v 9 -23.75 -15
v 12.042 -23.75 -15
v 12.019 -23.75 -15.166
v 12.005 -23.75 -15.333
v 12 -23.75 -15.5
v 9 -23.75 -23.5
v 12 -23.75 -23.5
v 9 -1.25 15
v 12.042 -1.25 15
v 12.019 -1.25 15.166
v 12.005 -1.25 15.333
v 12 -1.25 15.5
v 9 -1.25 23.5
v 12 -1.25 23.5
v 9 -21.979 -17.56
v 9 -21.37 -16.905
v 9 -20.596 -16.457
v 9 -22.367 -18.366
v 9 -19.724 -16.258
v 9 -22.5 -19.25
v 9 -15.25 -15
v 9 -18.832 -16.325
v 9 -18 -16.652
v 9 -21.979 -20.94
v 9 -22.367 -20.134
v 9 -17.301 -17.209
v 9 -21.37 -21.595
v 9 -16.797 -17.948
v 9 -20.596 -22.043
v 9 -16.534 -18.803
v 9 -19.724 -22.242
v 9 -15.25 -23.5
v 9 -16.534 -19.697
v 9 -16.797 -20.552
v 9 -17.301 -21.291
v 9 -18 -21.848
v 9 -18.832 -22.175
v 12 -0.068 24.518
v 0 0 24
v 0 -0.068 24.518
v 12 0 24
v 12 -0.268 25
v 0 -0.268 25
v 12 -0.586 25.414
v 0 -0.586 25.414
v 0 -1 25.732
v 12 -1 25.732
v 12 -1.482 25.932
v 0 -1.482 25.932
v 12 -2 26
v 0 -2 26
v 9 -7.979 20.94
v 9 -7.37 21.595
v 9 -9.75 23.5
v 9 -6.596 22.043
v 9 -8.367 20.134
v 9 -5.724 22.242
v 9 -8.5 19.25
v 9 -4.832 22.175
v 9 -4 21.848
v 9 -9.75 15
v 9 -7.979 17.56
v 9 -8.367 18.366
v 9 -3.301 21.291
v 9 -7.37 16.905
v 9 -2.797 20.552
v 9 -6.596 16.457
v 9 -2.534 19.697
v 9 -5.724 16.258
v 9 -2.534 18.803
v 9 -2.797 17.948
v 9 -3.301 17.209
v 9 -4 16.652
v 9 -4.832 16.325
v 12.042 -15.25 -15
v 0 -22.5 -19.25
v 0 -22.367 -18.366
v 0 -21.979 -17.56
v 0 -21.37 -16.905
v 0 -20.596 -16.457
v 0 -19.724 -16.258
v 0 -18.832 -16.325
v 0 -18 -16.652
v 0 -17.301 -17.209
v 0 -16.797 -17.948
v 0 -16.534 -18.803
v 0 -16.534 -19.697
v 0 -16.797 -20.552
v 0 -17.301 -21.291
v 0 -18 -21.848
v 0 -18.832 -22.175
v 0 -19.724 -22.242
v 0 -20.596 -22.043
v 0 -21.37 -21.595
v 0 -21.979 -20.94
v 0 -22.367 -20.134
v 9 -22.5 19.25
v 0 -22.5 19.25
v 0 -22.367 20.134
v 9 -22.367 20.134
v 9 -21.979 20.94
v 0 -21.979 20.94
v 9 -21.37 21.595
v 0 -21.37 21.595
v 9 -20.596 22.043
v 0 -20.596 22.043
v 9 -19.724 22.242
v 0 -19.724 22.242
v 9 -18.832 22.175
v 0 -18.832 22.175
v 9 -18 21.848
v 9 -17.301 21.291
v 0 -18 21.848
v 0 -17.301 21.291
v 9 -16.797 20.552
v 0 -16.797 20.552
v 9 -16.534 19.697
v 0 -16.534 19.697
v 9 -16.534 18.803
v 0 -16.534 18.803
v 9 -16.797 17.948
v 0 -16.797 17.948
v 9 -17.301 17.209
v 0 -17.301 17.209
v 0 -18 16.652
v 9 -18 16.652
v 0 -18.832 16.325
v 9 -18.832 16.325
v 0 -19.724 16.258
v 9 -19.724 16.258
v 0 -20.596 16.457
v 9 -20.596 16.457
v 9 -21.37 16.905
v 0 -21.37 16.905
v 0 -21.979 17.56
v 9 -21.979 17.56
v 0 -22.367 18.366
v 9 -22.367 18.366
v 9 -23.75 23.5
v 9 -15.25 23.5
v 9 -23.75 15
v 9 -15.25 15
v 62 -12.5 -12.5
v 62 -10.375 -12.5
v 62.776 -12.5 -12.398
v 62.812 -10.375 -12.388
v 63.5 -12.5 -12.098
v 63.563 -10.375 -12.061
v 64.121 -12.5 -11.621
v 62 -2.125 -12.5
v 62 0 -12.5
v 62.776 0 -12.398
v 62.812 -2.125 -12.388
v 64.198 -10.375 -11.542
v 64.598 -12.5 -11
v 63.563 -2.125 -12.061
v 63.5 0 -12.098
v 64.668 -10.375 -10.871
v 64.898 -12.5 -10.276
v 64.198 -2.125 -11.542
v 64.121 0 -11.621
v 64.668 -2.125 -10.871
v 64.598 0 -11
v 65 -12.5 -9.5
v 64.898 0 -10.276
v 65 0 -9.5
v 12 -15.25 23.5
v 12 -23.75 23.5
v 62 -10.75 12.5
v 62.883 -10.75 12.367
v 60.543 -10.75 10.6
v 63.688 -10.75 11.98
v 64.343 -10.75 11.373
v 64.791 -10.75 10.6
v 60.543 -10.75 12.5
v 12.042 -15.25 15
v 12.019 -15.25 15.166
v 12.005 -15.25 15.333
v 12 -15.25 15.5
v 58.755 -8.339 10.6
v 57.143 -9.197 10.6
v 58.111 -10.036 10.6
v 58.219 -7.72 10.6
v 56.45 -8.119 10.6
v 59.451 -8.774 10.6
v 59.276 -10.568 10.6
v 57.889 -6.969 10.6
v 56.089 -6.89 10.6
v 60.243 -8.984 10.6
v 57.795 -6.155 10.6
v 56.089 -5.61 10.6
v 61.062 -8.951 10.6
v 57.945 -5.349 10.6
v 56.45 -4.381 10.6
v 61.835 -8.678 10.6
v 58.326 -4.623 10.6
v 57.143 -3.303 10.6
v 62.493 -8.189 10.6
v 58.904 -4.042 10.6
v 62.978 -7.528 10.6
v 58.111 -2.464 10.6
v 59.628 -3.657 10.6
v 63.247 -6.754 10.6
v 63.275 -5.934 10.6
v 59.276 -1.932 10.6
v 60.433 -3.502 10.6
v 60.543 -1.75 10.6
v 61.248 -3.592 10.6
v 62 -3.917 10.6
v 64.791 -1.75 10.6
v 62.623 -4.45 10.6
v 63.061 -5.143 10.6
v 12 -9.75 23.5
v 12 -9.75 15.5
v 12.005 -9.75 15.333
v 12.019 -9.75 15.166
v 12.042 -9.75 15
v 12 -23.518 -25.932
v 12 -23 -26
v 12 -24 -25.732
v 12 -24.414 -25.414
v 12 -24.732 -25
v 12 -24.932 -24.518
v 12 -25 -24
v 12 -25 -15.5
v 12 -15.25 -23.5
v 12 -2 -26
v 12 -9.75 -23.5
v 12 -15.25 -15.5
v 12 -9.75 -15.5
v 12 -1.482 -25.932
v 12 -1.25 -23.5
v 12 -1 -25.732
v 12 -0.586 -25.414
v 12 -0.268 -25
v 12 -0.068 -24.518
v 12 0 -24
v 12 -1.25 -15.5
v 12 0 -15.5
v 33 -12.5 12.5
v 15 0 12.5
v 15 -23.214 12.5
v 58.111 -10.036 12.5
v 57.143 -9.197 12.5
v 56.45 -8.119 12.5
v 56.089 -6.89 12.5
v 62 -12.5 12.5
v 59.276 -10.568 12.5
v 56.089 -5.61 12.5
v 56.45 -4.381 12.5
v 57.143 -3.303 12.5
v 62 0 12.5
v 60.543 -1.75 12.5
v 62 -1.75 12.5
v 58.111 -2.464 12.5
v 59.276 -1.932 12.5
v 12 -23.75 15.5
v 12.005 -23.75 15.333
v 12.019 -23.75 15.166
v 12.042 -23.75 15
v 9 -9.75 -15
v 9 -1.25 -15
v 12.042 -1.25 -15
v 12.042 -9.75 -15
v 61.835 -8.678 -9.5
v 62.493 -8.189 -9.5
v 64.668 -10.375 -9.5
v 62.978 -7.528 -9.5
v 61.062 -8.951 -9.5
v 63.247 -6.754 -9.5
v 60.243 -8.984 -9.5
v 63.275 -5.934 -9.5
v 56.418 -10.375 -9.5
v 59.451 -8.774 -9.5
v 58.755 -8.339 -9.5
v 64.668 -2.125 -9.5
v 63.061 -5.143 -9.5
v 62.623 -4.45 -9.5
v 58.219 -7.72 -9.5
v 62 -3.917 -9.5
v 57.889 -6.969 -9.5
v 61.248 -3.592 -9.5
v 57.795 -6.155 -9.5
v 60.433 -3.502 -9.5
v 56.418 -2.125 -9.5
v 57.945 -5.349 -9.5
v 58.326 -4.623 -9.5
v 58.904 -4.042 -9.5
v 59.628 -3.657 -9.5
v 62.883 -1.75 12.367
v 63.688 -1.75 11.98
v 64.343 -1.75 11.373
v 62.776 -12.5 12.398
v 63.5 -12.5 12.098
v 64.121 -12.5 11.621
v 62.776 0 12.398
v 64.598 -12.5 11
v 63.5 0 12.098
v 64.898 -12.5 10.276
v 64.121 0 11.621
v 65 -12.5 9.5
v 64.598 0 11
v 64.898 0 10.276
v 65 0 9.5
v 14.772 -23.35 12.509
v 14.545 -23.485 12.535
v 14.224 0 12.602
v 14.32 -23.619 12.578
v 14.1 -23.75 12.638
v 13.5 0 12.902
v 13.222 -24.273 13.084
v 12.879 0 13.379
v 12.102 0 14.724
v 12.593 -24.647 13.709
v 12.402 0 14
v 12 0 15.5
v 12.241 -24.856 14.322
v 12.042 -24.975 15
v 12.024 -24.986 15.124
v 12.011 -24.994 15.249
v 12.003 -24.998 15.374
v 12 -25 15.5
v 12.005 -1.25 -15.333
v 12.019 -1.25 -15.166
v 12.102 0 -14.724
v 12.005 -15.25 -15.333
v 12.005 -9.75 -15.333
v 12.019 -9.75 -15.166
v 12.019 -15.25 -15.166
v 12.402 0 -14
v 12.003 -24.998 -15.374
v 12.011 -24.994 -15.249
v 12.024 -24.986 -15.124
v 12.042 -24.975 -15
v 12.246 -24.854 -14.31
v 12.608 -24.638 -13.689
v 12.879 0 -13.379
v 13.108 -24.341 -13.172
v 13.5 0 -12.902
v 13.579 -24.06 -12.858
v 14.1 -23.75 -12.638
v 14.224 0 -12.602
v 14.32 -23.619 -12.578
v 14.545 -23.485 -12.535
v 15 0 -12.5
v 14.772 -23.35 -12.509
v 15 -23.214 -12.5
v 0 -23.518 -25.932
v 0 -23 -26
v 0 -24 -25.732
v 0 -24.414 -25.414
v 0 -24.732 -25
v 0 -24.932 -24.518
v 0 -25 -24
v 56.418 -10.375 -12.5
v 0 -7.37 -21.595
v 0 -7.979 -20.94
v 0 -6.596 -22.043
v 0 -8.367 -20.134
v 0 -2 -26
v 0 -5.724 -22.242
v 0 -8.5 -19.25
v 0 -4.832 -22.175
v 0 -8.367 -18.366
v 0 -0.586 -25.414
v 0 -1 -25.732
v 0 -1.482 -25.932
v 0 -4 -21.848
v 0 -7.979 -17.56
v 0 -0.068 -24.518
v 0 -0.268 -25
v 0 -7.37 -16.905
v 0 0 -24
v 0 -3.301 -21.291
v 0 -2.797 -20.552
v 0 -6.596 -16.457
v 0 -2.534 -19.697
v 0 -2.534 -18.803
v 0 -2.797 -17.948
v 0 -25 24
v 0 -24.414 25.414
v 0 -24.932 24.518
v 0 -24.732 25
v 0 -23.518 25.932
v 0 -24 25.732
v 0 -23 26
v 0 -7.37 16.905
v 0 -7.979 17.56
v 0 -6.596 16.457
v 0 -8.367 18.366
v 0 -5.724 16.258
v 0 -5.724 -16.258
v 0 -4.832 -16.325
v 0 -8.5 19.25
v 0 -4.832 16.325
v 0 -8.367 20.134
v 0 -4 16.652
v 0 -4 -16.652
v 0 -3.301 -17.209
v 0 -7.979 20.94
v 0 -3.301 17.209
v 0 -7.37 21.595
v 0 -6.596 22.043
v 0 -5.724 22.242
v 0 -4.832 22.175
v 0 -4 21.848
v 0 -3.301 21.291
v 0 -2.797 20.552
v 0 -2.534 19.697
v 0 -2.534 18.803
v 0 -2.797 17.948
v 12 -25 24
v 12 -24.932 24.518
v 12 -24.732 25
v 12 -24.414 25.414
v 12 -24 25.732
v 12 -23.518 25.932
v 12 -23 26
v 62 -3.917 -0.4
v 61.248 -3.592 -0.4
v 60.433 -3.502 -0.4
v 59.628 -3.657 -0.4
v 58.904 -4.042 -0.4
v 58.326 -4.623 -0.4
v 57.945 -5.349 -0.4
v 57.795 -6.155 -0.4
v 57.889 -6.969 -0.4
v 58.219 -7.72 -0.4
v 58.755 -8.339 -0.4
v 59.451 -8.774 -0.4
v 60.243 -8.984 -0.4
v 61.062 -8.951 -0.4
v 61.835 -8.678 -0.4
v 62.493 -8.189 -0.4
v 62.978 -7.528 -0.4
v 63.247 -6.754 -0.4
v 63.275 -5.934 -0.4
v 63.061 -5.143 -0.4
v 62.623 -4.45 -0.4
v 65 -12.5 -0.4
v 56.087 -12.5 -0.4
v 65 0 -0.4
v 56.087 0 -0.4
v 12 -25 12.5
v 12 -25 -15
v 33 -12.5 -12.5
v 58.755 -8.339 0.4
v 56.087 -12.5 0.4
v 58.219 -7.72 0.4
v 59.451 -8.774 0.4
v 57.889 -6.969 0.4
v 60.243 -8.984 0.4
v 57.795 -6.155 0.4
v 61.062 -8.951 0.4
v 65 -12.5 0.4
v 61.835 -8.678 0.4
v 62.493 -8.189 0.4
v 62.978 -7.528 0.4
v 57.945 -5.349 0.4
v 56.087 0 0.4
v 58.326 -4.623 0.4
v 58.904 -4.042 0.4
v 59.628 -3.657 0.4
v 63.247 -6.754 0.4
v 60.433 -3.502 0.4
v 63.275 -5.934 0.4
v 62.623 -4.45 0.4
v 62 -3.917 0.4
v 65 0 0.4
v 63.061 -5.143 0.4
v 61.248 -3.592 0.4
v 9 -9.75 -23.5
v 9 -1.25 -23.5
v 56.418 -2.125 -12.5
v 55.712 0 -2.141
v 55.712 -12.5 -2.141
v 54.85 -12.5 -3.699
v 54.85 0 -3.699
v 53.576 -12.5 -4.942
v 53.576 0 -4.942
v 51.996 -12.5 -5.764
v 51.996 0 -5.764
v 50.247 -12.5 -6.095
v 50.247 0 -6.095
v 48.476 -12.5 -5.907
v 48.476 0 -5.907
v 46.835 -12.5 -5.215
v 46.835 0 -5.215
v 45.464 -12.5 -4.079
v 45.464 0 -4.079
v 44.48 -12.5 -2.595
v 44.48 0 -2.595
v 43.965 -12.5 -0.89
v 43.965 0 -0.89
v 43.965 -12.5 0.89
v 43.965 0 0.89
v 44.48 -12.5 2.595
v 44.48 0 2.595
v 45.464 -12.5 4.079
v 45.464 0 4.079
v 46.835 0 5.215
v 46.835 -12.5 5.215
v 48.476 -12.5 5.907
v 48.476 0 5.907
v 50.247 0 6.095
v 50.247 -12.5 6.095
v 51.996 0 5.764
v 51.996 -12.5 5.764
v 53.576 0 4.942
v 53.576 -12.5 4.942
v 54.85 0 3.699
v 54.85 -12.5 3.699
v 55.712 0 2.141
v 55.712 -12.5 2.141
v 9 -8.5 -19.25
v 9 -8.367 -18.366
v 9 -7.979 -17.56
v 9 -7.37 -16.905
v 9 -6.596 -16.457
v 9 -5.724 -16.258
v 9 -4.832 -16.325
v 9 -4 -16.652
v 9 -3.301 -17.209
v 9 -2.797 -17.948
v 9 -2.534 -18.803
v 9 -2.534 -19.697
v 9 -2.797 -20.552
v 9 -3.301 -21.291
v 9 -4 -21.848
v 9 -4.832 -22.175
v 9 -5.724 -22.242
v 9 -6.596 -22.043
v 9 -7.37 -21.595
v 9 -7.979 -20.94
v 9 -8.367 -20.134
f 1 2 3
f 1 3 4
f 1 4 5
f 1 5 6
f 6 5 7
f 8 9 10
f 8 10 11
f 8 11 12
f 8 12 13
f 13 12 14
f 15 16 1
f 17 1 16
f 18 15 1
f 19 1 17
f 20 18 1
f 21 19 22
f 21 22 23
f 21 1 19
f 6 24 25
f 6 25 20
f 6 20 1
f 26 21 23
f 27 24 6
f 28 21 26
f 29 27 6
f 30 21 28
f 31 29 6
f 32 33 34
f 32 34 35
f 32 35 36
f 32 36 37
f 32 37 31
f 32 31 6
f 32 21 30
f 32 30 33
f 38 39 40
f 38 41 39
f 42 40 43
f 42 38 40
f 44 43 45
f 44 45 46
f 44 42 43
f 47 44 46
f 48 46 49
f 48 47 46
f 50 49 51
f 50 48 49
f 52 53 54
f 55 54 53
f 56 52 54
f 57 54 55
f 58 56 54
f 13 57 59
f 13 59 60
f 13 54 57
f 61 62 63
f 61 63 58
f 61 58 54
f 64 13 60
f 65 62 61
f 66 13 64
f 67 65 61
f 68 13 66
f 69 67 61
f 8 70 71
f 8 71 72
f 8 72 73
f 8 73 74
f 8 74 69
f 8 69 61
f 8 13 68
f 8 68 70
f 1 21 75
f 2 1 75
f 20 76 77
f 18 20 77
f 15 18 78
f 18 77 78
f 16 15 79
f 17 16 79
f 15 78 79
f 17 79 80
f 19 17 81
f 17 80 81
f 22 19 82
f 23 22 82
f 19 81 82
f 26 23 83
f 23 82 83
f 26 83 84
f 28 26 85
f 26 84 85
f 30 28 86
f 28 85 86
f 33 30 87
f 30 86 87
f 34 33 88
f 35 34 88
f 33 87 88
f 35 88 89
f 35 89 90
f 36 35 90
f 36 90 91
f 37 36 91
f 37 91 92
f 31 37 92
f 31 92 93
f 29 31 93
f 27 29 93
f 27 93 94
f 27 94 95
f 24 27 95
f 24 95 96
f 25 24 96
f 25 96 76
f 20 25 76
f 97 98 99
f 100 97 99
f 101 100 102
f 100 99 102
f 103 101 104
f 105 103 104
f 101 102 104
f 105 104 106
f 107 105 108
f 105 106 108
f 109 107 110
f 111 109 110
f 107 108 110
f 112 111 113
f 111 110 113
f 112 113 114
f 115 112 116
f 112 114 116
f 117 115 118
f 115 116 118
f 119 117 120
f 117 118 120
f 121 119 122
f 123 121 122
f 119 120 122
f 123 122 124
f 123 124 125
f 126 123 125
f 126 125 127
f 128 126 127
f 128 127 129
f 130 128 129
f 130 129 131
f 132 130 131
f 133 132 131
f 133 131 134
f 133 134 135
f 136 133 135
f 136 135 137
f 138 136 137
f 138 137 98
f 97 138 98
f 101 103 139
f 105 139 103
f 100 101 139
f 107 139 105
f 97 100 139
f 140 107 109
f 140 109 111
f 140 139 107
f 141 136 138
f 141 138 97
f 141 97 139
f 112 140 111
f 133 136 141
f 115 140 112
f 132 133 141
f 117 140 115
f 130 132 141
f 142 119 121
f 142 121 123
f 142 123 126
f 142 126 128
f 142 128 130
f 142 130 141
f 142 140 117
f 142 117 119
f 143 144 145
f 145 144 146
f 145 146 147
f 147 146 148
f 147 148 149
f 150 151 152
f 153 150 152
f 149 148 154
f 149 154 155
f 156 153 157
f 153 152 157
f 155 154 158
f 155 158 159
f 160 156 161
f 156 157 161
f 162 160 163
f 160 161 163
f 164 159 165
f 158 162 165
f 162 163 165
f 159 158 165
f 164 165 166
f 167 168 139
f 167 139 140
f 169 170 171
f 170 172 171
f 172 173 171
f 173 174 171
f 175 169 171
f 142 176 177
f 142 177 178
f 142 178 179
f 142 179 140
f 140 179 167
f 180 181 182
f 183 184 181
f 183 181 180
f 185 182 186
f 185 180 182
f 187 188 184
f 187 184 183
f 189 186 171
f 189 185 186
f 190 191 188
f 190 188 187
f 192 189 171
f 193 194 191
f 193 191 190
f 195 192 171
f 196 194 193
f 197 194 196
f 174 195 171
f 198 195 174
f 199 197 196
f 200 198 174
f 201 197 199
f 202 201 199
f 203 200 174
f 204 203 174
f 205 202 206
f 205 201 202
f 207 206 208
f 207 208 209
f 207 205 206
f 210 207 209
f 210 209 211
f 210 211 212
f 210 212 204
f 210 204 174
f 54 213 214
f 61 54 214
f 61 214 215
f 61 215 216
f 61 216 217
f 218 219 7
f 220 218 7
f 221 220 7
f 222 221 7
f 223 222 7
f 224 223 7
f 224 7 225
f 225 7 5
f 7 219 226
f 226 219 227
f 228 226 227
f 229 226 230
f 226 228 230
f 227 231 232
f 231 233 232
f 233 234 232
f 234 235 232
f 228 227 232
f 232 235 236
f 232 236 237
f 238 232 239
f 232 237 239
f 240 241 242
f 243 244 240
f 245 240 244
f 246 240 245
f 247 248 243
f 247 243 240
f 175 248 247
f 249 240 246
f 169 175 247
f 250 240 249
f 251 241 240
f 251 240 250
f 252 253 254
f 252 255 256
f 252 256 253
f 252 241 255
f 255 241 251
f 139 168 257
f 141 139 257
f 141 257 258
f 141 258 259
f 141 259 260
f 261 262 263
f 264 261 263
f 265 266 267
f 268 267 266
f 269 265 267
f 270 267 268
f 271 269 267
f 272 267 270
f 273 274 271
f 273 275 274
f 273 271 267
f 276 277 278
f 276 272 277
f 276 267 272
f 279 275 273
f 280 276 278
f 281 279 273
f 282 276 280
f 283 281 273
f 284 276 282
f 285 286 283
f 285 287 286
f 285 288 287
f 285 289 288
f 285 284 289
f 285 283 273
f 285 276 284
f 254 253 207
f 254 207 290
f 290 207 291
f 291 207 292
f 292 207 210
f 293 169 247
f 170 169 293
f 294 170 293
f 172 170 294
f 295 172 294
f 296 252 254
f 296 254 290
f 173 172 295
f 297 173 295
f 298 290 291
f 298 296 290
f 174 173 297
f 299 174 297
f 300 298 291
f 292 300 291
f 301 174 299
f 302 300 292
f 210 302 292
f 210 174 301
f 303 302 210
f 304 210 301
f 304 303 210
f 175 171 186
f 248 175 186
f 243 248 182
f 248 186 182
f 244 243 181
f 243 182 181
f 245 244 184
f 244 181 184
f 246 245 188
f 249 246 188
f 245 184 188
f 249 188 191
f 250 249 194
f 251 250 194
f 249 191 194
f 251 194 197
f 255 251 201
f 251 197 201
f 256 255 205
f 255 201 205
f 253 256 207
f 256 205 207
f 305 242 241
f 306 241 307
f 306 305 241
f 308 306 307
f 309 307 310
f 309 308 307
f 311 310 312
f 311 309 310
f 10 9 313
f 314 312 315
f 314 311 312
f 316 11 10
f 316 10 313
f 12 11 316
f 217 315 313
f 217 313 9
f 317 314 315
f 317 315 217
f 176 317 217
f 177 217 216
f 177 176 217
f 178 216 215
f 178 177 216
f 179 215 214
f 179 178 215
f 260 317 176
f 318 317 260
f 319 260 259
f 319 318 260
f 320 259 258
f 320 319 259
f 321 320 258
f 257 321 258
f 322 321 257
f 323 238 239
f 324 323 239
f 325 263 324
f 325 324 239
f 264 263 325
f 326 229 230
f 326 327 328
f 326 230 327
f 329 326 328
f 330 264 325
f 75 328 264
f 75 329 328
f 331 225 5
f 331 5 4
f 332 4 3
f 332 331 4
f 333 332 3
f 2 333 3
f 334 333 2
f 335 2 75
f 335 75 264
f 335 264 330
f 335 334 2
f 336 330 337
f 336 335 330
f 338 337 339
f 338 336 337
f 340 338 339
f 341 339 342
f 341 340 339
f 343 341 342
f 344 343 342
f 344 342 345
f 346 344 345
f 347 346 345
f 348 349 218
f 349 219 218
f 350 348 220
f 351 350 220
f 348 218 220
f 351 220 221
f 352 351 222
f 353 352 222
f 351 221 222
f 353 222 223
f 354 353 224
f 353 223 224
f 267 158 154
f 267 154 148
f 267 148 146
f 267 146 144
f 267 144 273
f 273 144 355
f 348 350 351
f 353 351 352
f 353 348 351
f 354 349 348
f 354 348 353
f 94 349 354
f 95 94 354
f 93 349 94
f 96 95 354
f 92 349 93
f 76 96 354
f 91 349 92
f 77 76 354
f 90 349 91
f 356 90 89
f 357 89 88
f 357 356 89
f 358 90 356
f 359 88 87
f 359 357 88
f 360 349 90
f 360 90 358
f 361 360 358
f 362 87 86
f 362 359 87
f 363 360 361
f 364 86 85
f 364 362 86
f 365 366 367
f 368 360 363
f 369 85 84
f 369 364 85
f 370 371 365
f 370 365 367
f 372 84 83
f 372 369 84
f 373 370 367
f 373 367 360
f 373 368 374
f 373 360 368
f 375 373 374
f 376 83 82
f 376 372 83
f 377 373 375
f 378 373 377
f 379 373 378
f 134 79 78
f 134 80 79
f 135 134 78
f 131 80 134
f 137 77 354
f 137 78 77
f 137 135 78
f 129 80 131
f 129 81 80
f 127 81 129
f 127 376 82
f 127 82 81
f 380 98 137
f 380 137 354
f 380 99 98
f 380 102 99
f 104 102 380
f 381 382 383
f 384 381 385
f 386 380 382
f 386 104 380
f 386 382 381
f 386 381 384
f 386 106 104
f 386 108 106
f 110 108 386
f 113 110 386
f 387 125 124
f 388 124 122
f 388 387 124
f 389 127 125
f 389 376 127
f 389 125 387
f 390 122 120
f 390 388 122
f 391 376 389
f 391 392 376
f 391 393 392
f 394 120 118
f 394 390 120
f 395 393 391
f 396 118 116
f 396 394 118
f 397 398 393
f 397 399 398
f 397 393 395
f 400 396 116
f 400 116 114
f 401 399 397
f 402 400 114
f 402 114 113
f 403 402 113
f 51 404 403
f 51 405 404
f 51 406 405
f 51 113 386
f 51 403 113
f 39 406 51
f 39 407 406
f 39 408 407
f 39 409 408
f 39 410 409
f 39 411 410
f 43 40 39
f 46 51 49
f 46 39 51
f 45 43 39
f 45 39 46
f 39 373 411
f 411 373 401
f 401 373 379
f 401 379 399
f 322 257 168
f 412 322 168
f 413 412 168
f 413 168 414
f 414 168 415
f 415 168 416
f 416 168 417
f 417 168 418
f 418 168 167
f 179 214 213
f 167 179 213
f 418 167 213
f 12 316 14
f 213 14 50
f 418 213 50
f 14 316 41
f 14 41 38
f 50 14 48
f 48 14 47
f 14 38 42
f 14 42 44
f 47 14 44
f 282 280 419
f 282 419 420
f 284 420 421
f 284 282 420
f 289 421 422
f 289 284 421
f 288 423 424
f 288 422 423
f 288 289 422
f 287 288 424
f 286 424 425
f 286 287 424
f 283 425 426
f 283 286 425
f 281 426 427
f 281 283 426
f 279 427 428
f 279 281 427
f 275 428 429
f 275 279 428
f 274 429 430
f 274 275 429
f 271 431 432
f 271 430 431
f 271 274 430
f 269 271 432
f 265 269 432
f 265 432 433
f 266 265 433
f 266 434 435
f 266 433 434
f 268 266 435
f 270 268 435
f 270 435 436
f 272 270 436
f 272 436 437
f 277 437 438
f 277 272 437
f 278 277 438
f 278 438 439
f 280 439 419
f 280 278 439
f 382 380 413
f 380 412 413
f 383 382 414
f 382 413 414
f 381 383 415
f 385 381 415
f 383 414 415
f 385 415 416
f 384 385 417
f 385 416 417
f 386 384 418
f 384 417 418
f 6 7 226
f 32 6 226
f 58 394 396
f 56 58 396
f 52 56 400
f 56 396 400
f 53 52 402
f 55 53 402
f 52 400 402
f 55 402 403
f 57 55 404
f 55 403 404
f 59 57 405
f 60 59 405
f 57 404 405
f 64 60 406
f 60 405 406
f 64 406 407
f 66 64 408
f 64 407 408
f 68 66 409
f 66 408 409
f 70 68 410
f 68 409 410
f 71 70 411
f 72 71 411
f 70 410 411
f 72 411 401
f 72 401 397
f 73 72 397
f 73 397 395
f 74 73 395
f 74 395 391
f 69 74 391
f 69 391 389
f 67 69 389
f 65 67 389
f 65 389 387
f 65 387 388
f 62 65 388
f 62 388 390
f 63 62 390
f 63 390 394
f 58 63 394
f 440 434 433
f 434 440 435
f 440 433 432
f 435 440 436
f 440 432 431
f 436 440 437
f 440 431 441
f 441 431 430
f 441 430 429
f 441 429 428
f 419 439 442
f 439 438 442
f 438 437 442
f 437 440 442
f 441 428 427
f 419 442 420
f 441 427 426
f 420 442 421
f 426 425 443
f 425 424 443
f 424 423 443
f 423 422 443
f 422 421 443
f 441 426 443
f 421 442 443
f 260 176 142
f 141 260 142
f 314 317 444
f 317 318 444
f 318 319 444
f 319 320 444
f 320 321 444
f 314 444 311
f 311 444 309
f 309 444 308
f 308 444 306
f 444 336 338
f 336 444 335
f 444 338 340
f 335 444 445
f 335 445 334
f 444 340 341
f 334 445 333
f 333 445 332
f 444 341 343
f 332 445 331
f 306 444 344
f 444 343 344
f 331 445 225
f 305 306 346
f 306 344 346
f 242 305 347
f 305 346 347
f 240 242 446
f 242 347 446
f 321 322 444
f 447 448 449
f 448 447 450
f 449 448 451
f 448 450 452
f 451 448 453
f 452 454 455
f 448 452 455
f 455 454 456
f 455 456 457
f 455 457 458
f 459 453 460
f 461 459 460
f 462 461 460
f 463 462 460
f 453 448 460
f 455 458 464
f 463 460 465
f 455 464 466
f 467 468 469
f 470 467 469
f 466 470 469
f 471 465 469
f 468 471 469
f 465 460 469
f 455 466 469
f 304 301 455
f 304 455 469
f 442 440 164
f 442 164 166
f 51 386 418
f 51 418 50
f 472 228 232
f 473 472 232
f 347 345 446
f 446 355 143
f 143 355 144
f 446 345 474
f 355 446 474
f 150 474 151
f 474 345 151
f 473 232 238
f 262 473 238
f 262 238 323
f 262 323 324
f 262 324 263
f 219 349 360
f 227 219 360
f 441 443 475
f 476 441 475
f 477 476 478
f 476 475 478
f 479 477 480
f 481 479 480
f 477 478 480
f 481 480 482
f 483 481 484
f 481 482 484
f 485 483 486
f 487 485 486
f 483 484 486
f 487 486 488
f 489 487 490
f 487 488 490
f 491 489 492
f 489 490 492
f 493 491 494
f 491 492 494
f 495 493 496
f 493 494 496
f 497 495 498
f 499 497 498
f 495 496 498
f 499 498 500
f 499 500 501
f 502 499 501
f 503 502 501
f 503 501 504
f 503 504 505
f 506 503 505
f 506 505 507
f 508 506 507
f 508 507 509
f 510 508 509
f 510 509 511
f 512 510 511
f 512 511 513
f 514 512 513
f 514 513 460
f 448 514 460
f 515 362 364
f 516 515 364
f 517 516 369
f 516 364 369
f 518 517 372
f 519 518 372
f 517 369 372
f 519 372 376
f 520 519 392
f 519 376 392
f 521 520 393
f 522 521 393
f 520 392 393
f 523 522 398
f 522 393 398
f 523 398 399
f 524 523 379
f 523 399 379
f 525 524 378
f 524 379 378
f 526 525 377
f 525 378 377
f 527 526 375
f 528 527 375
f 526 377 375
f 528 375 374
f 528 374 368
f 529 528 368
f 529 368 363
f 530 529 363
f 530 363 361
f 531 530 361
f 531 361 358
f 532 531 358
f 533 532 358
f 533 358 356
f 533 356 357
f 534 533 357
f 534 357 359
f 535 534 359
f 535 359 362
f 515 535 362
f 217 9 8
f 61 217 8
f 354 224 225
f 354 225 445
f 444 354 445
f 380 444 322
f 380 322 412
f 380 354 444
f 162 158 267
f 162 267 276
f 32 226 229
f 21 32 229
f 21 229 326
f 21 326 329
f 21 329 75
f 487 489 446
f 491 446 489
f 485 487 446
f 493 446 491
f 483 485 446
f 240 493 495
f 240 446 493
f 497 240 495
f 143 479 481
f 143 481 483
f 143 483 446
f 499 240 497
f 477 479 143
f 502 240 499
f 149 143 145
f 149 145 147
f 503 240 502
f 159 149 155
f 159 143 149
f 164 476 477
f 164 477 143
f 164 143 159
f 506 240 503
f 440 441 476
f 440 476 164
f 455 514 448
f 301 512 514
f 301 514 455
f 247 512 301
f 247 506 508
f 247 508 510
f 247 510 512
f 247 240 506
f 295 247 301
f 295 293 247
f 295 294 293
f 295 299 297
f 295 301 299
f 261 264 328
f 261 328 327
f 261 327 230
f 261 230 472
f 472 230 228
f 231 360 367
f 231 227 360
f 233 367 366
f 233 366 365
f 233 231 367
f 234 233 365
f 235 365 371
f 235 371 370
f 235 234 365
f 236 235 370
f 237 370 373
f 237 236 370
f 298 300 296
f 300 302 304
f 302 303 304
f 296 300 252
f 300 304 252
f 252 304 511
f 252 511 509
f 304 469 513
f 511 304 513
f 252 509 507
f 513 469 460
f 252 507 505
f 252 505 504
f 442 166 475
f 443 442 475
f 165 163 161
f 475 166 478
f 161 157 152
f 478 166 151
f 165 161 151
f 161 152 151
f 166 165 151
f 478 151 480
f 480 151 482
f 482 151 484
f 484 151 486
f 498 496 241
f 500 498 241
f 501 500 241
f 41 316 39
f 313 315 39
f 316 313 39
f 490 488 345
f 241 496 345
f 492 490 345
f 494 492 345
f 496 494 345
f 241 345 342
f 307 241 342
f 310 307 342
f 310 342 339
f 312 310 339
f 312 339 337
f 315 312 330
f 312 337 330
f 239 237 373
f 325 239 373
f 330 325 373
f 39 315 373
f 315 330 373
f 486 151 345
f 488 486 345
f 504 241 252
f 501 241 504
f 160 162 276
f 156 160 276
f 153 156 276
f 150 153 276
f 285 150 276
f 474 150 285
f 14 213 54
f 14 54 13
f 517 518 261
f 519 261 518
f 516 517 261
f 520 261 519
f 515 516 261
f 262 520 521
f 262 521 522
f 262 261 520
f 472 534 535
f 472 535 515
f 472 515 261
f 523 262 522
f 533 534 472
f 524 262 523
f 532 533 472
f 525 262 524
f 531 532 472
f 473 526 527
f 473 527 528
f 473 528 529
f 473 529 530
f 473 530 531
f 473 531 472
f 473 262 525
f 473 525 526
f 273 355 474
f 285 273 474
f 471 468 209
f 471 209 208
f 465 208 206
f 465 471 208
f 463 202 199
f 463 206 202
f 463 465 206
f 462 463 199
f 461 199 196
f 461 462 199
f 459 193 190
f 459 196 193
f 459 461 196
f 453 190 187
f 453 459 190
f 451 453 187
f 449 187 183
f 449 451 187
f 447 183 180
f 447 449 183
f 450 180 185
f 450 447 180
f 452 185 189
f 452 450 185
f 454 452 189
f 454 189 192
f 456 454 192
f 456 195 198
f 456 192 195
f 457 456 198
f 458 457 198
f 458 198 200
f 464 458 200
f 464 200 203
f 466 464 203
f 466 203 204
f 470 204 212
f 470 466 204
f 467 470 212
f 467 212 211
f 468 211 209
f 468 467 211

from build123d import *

# Parameters (mm, degrees)
BOSS_EXTRUDE1_DEPTH     = 12.5
SKETCH2_W               = 52
SKETCH2_H               = 25
SKETCH2_R               = 3
BOSS_EXTRUDE2_DEPTH     = 12
CUT_EXTRUDE2_DEPTH      = 75.33707016
FILLET1_R               = 2
FILLET2_R               = 3
CUT_EXTRUDE3_DEPTH      = 75.47791619
CUT_EXTRUDE3_DEPTH_BACK = 75.47791619
SKETCH7_R               = 2.75
CUT_EXTRUDE4_START      = 11
SKETCH7_3_R             = 2.75
CUT_EXTRUDE4_DEPTH      = 20
SKETCH9_W               = 8.25
SKETCH9_H               = 8.25
CUT_EXTRUDE5_DEPTH      = 3
SKETCH12_W              = 8.5
SKETCH12_H              = 8.5
CUT_EXTRUDE7_DEPTH      = 3
FILLET3_R               = 3


with BuildPart() as part:
    # Sketch1 → Boss-Extrude1 (new, symmetric)
    with BuildSketch(Plane.XY):
        Polygon((12, -25), (33, -12.5), (65, -12.5), (65, 0), (0, 0), (0, -25), align=None)
    extrude(amount=BOSS_EXTRUDE1_DEPTH, both=True)

    # Sketch2 → Boss-Extrude2 (add)
    with BuildSketch(Plane.ZY):
        with Locations((0, -12.5)):
            Rectangle(SKETCH2_W, SKETCH2_H)
        with Locations(Location((-19.25, -5.5, 0), (0, 0, 270))):
            Circle(SKETCH2_R, mode=Mode.SUBTRACT)
        with Locations(Location((-19.25, -19.5, 0), (0, 0, 270))):
            Circle(SKETCH2_R, mode=Mode.SUBTRACT)
        with Locations(Location((19.25, -19.5, 0), (0, 0, 270))):
            Circle(SKETCH2_R, mode=Mode.SUBTRACT)
        with Locations(Location((19.25, -5.5, 0), (0, 0, 270))):
            Circle(SKETCH2_R, mode=Mode.SUBTRACT)
    extrude(amount=-BOSS_EXTRUDE2_DEPTH)

    # Sketch4 → Cut-Extrude2 (cut, through all)
    with BuildSketch(Plane(origin=(0, 0, 0), x_dir=(1, 0, 0), z_dir=(0, 1, 0))):
        with BuildLine():
            Line((56.086871117, -0.4), (65, -0.4))
            Line((65, -0.4), (65, 0.4))
            Line((65, 0.4), (56.086871117, 0.4))
            ThreePointArc((56.086871117, 0.4), (43.9, 0), (56.086871117, -0.4))
        make_face()
    extrude(amount=-CUT_EXTRUDE2_DEPTH, mode=Mode.SUBTRACT)

    # Fillet1
    fillet1_edges = [part.edges().sort_by_distance(p)[0] for p in [
        (6, -25, -26),
        (6, 0, -26),
        (6, 0, 26),
        (6, -25, 26),
    ]]
    fillet(fillet1_edges, radius=FILLET1_R)

    # Fillet2
    fillet2_edges = [part.edges().sort_by_distance(p)[0] for p in [
        (65, -6.25, 12.5),
        (65, -6.25, -12.5),
    ]]
    fillet(fillet2_edges, radius=FILLET2_R)

    # Sketch7 → Cut-Extrude3 (cut, two sides: drawn at the far end of the back side and taken through both)
    with BuildSketch(Plane.XY.offset(-0.4).offset(-CUT_EXTRUDE3_DEPTH_BACK)):
        with Locations(Location((60.543435559, -6.25, 0), (0, 0, 58.017528447))):
            Circle(SKETCH7_R)
    extrude(amount=CUT_EXTRUDE3_DEPTH + CUT_EXTRUDE3_DEPTH_BACK, mode=Mode.SUBTRACT)

    # Sketch7<3> → Cut-Extrude4 (cut)
    with BuildSketch(Plane.XY.offset(-0.4).offset(CUT_EXTRUDE4_START)):
        with Locations((60.543435559, -6.25)):
            Circle(SKETCH7_3_R)
        with BuildLine():
            Line((60.543435559, -1.75), (65, -1.75))
            Line((65, -1.75), (65, -10.75))
            Line((65, -10.75), (60.543435559, -10.75))
            ThreePointArc((60.543435559, -10.75), (56.043435559, -6.25), (60.543435559, -1.75))
        make_face()
    extrude(amount=CUT_EXTRUDE4_DEPTH, mode=Mode.SUBTRACT)

    # Sketch9 → Cut-Extrude5 (cut)
    with BuildSketch(Plane(origin=(0, 0, -12.5), x_dir=(-1, 0, 0), z_dir=(0, 0, -1))):
        with Locations((-60.543435559, -6.25)):
            Rectangle(SKETCH9_W, SKETCH9_H)
    extrude(amount=-CUT_EXTRUDE5_DEPTH, mode=Mode.SUBTRACT)

    # Sketch12 → Cut-Extrude7 (cut)
    with BuildSketch(Plane(origin=(12, 0, 0), x_dir=(0, 0, -1), z_dir=(1, 0, 0))):
        with Locations((19.25, -5.5)):
            Rectangle(SKETCH12_W, SKETCH12_H)
        with Locations((-19.25, -5.5)):
            Rectangle(SKETCH12_W, SKETCH12_H)
        with Locations((19.25, -19.5)):
            Rectangle(SKETCH12_W, SKETCH12_H)
        with Locations((-19.25, -19.5)):
            Rectangle(SKETCH12_W, SKETCH12_H)
    extrude(amount=-CUT_EXTRUDE7_DEPTH, mode=Mode.SUBTRACT)

    # Fillet3
    # the kernel refuses this fillet: 3 mm, written as the material it adds along each edge
    with BuildSketch(Plane(origin=(12, -32.5, -12.5), x_dir=(1, 0, 0), z_dir=(0, 1, 0))) as fillet3_piece_1_section:
        with BuildLine():
            CenterArc((FILLET3_R, FILLET3_R), FILLET3_R, 180, 90)
            Line((0, FILLET3_R), (0, 0))
            Line((0, 0), (FILLET3_R, 0))
        make_face()
    fillet3_piece_1 = extrude(amount=32.5, mode=Mode.PRIVATE)
    fillet3_piece_1 = split(fillet3_piece_1, bisect_by=Plane(origin=(12.672630608, -24.599624638, -13.288072161), z_dir=(-0.5114838597676827, 0.8592928844097069, 0)), keep=Keep.TOP, mode=Mode.PRIVATE)
    fillet3_piece_1 = split(fillet3_piece_1, bisect_by=Plane(origin=(12.457820622, -24.238743862, -15), z_dir=(0, 0, 1)), keep=Keep.TOP, mode=Mode.PRIVATE)
    add(fillet3_piece_1)
    with BuildSketch(Plane(origin=(12, -32.5, -12.5), x_dir=(1, 0, 0), z_dir=(0, 1, 0))) as fillet3_piece_2_section:
        with BuildLine():
            CenterArc((FILLET3_R, FILLET3_R), FILLET3_R, 180, 90)
            Line((0, FILLET3_R), (0, 0))
            Line((0, 0), (FILLET3_R, 0))
        make_face()
    fillet3_piece_2 = extrude(amount=40, mode=Mode.PRIVATE)
    fillet3_piece_2 = split(fillet3_piece_2, bisect_by=Plane(origin=(12.285585988, -24.830008341, -15.125075667), z_dir=(-0.5114838597676827, 0.8592928844097069, 0)), keep=Keep.TOP, mode=Mode.PRIVATE)
    fillet3_piece_2 = split(fillet3_piece_2, bisect_by=Plane(origin=(12.012528257, -23.75, -15.125075667), z_dir=(0, -1, 0)), keep=Keep.TOP, mode=Mode.PRIVATE)
    add(fillet3_piece_2)
    with BuildSketch(Plane(origin=(12, -32.5, -12.5), x_dir=(1, 0, 0), z_dir=(0, 1, 0))) as fillet3_piece_3_section:
        with BuildLine():
            CenterArc((FILLET3_R, FILLET3_R), FILLET3_R, 180, 90)
            Line((0, FILLET3_R), (0, 0))
            Line((0, 0), (FILLET3_R, 0))
        make_face()
    fillet3_piece_3 = extrude(amount=40, mode=Mode.PRIVATE)
    fillet3_piece_3 = split(fillet3_piece_3, bisect_by=Plane(origin=(12.012572796, -15.25, -15.124824501), z_dir=(0, 1, 0)), keep=Keep.TOP, mode=Mode.PRIVATE)
    fillet3_piece_3 = split(fillet3_piece_3, bisect_by=Plane(origin=(12.012572796, -9.75, -15.124824501), z_dir=(0, -1, 0)), keep=Keep.TOP, mode=Mode.PRIVATE)
    add(fillet3_piece_3)
    with BuildSketch(Plane(origin=(12, -32.5, -12.5), x_dir=(1, 0, 0), z_dir=(0, 1, 0))) as fillet3_piece_4_section:
        with BuildLine():
            CenterArc((FILLET3_R, FILLET3_R), FILLET3_R, 180, 90)
            Line((0, FILLET3_R), (0, 0))
            Line((0, 0), (FILLET3_R, 0))
        make_face()
    fillet3_piece_4 = extrude(amount=32.5, mode=Mode.PRIVATE)
    fillet3_piece_4 = split(fillet3_piece_4, bisect_by=Plane(origin=(12.012572796, -1.25, -15.124824501), z_dir=(0, 1, 0)), keep=Keep.TOP, mode=Mode.PRIVATE)
    add(fillet3_piece_4)
    with BuildSketch(Plane(origin=(12, -32.5, 12.5), x_dir=(1, 0, 0), z_dir=(0, 1, 0))) as fillet3_piece_5_section:
        with BuildLine():
            CenterArc((FILLET3_R, -FILLET3_R), FILLET3_R, 90, 90)
            Line((0, -FILLET3_R), (0, 0))
            Line((0, 0), (FILLET3_R, 0))
        make_face()
    fillet3_piece_5 = extrude(amount=32.5, mode=Mode.PRIVATE)
    fillet3_piece_5 = split(fillet3_piece_5, bisect_by=Plane(origin=(12.672630608, -24.599624638, 13.288072161), z_dir=(-0.5114838597676827, 0.8592928844097069, 0)), keep=Keep.TOP, mode=Mode.PRIVATE)
    fillet3_piece_5 = split(fillet3_piece_5, bisect_by=Plane(origin=(12.457820622, -24.238743862, 15), z_dir=(0, 0, -1)), keep=Keep.TOP, mode=Mode.PRIVATE)
    add(fillet3_piece_5)
    with BuildSketch(Plane(origin=(12, -32.5, 12.5), x_dir=(1, 0, 0), z_dir=(0, 1, 0))) as fillet3_piece_6_section:
        with BuildLine():
            CenterArc((FILLET3_R, -FILLET3_R), FILLET3_R, 90, 90)
            Line((0, -FILLET3_R), (0, 0))
            Line((0, 0), (FILLET3_R, 0))
        make_face()
    fillet3_piece_6 = extrude(amount=40, mode=Mode.PRIVATE)
    fillet3_piece_6 = split(fillet3_piece_6, bisect_by=Plane(origin=(12.285585988, -24.830008341, 15.125075667), z_dir=(-0.5114838597676827, 0.8592928844097069, 0)), keep=Keep.TOP, mode=Mode.PRIVATE)
    fillet3_piece_6 = split(fillet3_piece_6, bisect_by=Plane(origin=(12.012528257, -23.75, 15.125075667), z_dir=(0, -1, 0)), keep=Keep.TOP, mode=Mode.PRIVATE)
    add(fillet3_piece_6)
    with BuildSketch(Plane(origin=(12, -32.5, 12.5), x_dir=(1, 0, 0), z_dir=(0, 1, 0))) as fillet3_piece_7_section:
        with BuildLine():
            CenterArc((FILLET3_R, -FILLET3_R), FILLET3_R, 90, 90)
            Line((0, -FILLET3_R), (0, 0))
            Line((0, 0), (FILLET3_R, 0))
        make_face()
    fillet3_piece_7 = extrude(amount=40, mode=Mode.PRIVATE)
    fillet3_piece_7 = split(fillet3_piece_7, bisect_by=Plane(origin=(12.012572796, -15.25, 15.124824501), z_dir=(0, 1, 0)), keep=Keep.TOP, mode=Mode.PRIVATE)
    fillet3_piece_7 = split(fillet3_piece_7, bisect_by=Plane(origin=(12.012572796, -9.75, 15.124824501), z_dir=(0, -1, 0)), keep=Keep.TOP, mode=Mode.PRIVATE)
    add(fillet3_piece_7)
    with BuildSketch(Plane(origin=(12, -32.5, 12.5), x_dir=(1, 0, 0), z_dir=(0, 1, 0))) as fillet3_piece_8_section:
        with BuildLine():
            CenterArc((FILLET3_R, -FILLET3_R), FILLET3_R, 90, 90)
            Line((0, -FILLET3_R), (0, 0))
            Line((0, 0), (FILLET3_R, 0))
        make_face()
    fillet3_piece_8 = extrude(amount=32.5, mode=Mode.PRIVATE)
    fillet3_piece_8 = split(fillet3_piece_8, bisect_by=Plane(origin=(12.012572796, -1.25, 15.124824501), z_dir=(0, 1, 0)), keep=Keep.TOP, mode=Mode.PRIVATE)
    add(fillet3_piece_8)


solid = part.part
